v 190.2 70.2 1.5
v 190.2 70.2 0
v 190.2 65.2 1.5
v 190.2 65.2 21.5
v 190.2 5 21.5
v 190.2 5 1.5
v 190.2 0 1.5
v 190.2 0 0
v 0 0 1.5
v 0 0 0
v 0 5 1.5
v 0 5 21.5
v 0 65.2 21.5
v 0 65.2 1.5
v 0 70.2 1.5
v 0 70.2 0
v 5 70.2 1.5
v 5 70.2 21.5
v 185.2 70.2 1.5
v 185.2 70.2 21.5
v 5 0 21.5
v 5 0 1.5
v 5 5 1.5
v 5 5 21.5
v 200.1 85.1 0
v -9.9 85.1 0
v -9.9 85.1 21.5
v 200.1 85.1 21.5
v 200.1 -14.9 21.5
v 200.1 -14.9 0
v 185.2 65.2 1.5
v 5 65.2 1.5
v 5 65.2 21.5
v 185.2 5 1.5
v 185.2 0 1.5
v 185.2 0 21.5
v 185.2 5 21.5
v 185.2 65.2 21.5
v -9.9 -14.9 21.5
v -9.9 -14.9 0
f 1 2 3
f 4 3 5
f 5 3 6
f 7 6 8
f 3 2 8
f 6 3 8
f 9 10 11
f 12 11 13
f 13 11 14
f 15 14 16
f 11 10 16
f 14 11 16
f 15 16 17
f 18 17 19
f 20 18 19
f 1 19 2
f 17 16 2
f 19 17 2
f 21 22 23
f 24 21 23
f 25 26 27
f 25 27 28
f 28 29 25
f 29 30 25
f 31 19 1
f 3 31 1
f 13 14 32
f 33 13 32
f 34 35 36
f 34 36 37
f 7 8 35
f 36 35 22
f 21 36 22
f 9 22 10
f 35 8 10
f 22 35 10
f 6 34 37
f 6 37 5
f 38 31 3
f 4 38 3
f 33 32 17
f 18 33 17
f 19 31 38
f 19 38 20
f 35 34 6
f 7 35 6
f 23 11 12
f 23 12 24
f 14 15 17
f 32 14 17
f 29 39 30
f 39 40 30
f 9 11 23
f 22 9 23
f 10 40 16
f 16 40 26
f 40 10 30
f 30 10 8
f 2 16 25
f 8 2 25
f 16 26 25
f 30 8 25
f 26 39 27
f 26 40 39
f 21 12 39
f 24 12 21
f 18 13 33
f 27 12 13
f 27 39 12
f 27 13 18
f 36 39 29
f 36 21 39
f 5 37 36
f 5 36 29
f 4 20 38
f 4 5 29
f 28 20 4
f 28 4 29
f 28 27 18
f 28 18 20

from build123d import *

# Parameters (mm, degrees)
SKETCH1_W           = 210
SKETCH1_H           = 100
SKETCH1_W_2         = 190.2
SKETCH1_H_2         = 70.2
BOSS_EXTRUDE1_DEPTH = 1.5
SKETCH2_W           = 210
SKETCH2_H           = 100
SKETCH2_W_2         = 5
SKETCH2_H_2         = 5
BOSS_EXTRUDE2_DEPTH = 20


with BuildPart() as part:
    # Sketch1 → Boss-Extrude1 (new body)
    with BuildSketch(Plane.XY):
        with Locations((95.1, 35.1)):
            Rectangle(SKETCH1_W, SKETCH1_H)
        with Locations((95.1, 35.1)):
            Rectangle(SKETCH1_W_2, SKETCH1_H_2, mode=Mode.SUBTRACT)
    extrude(amount=BOSS_EXTRUDE1_DEPTH)

    # Sketch2 → Boss-Extrude2 (add)
    # profile 1 of 5: a face of its own
    with BuildSketch(Plane.XY.offset(1.5)):
        with Locations((95.1, 35.1)):
            Rectangle(SKETCH2_W, SKETCH2_H)
        Polygon((0, 65.2), (0, 70.2), (5, 70.2), (185.2, 70.2), (190.2, 70.2), (190.2, 65.2), (190.2, 5), (190.2, 0), (185.2, 0), (5, 0), (0, 0), (0, 5), align=None, mode=Mode.SUBTRACT)
    # profile 2 of 5: a face of its own
    with BuildSketch(Plane.XY.offset(1.5)):
        with Locations((2.5, 67.7)):
            Rectangle(SKETCH2_W_2, SKETCH2_H_2)
    # profile 3 of 5: a face of its own
    with BuildSketch(Plane.XY.offset(1.5)):
        with Locations((2.5, 2.5)):
            Rectangle(SKETCH2_W_2, SKETCH2_H_2)
    # profile 4 of 5: a face of its own
    with BuildSketch(Plane.XY.offset(1.5)):
        with Locations((187.7, 67.7)):
            Rectangle(SKETCH2_W_2, SKETCH2_H_2)
    # profile 5 of 5: a face of its own
    with BuildSketch(Plane.XY.offset(1.5)):
        with Locations((187.7, 2.5)):
            Rectangle(SKETCH2_W_2, SKETCH2_H_2)
    extrude(amount=BOSS_EXTRUDE2_DEPTH)


solid = part.part
